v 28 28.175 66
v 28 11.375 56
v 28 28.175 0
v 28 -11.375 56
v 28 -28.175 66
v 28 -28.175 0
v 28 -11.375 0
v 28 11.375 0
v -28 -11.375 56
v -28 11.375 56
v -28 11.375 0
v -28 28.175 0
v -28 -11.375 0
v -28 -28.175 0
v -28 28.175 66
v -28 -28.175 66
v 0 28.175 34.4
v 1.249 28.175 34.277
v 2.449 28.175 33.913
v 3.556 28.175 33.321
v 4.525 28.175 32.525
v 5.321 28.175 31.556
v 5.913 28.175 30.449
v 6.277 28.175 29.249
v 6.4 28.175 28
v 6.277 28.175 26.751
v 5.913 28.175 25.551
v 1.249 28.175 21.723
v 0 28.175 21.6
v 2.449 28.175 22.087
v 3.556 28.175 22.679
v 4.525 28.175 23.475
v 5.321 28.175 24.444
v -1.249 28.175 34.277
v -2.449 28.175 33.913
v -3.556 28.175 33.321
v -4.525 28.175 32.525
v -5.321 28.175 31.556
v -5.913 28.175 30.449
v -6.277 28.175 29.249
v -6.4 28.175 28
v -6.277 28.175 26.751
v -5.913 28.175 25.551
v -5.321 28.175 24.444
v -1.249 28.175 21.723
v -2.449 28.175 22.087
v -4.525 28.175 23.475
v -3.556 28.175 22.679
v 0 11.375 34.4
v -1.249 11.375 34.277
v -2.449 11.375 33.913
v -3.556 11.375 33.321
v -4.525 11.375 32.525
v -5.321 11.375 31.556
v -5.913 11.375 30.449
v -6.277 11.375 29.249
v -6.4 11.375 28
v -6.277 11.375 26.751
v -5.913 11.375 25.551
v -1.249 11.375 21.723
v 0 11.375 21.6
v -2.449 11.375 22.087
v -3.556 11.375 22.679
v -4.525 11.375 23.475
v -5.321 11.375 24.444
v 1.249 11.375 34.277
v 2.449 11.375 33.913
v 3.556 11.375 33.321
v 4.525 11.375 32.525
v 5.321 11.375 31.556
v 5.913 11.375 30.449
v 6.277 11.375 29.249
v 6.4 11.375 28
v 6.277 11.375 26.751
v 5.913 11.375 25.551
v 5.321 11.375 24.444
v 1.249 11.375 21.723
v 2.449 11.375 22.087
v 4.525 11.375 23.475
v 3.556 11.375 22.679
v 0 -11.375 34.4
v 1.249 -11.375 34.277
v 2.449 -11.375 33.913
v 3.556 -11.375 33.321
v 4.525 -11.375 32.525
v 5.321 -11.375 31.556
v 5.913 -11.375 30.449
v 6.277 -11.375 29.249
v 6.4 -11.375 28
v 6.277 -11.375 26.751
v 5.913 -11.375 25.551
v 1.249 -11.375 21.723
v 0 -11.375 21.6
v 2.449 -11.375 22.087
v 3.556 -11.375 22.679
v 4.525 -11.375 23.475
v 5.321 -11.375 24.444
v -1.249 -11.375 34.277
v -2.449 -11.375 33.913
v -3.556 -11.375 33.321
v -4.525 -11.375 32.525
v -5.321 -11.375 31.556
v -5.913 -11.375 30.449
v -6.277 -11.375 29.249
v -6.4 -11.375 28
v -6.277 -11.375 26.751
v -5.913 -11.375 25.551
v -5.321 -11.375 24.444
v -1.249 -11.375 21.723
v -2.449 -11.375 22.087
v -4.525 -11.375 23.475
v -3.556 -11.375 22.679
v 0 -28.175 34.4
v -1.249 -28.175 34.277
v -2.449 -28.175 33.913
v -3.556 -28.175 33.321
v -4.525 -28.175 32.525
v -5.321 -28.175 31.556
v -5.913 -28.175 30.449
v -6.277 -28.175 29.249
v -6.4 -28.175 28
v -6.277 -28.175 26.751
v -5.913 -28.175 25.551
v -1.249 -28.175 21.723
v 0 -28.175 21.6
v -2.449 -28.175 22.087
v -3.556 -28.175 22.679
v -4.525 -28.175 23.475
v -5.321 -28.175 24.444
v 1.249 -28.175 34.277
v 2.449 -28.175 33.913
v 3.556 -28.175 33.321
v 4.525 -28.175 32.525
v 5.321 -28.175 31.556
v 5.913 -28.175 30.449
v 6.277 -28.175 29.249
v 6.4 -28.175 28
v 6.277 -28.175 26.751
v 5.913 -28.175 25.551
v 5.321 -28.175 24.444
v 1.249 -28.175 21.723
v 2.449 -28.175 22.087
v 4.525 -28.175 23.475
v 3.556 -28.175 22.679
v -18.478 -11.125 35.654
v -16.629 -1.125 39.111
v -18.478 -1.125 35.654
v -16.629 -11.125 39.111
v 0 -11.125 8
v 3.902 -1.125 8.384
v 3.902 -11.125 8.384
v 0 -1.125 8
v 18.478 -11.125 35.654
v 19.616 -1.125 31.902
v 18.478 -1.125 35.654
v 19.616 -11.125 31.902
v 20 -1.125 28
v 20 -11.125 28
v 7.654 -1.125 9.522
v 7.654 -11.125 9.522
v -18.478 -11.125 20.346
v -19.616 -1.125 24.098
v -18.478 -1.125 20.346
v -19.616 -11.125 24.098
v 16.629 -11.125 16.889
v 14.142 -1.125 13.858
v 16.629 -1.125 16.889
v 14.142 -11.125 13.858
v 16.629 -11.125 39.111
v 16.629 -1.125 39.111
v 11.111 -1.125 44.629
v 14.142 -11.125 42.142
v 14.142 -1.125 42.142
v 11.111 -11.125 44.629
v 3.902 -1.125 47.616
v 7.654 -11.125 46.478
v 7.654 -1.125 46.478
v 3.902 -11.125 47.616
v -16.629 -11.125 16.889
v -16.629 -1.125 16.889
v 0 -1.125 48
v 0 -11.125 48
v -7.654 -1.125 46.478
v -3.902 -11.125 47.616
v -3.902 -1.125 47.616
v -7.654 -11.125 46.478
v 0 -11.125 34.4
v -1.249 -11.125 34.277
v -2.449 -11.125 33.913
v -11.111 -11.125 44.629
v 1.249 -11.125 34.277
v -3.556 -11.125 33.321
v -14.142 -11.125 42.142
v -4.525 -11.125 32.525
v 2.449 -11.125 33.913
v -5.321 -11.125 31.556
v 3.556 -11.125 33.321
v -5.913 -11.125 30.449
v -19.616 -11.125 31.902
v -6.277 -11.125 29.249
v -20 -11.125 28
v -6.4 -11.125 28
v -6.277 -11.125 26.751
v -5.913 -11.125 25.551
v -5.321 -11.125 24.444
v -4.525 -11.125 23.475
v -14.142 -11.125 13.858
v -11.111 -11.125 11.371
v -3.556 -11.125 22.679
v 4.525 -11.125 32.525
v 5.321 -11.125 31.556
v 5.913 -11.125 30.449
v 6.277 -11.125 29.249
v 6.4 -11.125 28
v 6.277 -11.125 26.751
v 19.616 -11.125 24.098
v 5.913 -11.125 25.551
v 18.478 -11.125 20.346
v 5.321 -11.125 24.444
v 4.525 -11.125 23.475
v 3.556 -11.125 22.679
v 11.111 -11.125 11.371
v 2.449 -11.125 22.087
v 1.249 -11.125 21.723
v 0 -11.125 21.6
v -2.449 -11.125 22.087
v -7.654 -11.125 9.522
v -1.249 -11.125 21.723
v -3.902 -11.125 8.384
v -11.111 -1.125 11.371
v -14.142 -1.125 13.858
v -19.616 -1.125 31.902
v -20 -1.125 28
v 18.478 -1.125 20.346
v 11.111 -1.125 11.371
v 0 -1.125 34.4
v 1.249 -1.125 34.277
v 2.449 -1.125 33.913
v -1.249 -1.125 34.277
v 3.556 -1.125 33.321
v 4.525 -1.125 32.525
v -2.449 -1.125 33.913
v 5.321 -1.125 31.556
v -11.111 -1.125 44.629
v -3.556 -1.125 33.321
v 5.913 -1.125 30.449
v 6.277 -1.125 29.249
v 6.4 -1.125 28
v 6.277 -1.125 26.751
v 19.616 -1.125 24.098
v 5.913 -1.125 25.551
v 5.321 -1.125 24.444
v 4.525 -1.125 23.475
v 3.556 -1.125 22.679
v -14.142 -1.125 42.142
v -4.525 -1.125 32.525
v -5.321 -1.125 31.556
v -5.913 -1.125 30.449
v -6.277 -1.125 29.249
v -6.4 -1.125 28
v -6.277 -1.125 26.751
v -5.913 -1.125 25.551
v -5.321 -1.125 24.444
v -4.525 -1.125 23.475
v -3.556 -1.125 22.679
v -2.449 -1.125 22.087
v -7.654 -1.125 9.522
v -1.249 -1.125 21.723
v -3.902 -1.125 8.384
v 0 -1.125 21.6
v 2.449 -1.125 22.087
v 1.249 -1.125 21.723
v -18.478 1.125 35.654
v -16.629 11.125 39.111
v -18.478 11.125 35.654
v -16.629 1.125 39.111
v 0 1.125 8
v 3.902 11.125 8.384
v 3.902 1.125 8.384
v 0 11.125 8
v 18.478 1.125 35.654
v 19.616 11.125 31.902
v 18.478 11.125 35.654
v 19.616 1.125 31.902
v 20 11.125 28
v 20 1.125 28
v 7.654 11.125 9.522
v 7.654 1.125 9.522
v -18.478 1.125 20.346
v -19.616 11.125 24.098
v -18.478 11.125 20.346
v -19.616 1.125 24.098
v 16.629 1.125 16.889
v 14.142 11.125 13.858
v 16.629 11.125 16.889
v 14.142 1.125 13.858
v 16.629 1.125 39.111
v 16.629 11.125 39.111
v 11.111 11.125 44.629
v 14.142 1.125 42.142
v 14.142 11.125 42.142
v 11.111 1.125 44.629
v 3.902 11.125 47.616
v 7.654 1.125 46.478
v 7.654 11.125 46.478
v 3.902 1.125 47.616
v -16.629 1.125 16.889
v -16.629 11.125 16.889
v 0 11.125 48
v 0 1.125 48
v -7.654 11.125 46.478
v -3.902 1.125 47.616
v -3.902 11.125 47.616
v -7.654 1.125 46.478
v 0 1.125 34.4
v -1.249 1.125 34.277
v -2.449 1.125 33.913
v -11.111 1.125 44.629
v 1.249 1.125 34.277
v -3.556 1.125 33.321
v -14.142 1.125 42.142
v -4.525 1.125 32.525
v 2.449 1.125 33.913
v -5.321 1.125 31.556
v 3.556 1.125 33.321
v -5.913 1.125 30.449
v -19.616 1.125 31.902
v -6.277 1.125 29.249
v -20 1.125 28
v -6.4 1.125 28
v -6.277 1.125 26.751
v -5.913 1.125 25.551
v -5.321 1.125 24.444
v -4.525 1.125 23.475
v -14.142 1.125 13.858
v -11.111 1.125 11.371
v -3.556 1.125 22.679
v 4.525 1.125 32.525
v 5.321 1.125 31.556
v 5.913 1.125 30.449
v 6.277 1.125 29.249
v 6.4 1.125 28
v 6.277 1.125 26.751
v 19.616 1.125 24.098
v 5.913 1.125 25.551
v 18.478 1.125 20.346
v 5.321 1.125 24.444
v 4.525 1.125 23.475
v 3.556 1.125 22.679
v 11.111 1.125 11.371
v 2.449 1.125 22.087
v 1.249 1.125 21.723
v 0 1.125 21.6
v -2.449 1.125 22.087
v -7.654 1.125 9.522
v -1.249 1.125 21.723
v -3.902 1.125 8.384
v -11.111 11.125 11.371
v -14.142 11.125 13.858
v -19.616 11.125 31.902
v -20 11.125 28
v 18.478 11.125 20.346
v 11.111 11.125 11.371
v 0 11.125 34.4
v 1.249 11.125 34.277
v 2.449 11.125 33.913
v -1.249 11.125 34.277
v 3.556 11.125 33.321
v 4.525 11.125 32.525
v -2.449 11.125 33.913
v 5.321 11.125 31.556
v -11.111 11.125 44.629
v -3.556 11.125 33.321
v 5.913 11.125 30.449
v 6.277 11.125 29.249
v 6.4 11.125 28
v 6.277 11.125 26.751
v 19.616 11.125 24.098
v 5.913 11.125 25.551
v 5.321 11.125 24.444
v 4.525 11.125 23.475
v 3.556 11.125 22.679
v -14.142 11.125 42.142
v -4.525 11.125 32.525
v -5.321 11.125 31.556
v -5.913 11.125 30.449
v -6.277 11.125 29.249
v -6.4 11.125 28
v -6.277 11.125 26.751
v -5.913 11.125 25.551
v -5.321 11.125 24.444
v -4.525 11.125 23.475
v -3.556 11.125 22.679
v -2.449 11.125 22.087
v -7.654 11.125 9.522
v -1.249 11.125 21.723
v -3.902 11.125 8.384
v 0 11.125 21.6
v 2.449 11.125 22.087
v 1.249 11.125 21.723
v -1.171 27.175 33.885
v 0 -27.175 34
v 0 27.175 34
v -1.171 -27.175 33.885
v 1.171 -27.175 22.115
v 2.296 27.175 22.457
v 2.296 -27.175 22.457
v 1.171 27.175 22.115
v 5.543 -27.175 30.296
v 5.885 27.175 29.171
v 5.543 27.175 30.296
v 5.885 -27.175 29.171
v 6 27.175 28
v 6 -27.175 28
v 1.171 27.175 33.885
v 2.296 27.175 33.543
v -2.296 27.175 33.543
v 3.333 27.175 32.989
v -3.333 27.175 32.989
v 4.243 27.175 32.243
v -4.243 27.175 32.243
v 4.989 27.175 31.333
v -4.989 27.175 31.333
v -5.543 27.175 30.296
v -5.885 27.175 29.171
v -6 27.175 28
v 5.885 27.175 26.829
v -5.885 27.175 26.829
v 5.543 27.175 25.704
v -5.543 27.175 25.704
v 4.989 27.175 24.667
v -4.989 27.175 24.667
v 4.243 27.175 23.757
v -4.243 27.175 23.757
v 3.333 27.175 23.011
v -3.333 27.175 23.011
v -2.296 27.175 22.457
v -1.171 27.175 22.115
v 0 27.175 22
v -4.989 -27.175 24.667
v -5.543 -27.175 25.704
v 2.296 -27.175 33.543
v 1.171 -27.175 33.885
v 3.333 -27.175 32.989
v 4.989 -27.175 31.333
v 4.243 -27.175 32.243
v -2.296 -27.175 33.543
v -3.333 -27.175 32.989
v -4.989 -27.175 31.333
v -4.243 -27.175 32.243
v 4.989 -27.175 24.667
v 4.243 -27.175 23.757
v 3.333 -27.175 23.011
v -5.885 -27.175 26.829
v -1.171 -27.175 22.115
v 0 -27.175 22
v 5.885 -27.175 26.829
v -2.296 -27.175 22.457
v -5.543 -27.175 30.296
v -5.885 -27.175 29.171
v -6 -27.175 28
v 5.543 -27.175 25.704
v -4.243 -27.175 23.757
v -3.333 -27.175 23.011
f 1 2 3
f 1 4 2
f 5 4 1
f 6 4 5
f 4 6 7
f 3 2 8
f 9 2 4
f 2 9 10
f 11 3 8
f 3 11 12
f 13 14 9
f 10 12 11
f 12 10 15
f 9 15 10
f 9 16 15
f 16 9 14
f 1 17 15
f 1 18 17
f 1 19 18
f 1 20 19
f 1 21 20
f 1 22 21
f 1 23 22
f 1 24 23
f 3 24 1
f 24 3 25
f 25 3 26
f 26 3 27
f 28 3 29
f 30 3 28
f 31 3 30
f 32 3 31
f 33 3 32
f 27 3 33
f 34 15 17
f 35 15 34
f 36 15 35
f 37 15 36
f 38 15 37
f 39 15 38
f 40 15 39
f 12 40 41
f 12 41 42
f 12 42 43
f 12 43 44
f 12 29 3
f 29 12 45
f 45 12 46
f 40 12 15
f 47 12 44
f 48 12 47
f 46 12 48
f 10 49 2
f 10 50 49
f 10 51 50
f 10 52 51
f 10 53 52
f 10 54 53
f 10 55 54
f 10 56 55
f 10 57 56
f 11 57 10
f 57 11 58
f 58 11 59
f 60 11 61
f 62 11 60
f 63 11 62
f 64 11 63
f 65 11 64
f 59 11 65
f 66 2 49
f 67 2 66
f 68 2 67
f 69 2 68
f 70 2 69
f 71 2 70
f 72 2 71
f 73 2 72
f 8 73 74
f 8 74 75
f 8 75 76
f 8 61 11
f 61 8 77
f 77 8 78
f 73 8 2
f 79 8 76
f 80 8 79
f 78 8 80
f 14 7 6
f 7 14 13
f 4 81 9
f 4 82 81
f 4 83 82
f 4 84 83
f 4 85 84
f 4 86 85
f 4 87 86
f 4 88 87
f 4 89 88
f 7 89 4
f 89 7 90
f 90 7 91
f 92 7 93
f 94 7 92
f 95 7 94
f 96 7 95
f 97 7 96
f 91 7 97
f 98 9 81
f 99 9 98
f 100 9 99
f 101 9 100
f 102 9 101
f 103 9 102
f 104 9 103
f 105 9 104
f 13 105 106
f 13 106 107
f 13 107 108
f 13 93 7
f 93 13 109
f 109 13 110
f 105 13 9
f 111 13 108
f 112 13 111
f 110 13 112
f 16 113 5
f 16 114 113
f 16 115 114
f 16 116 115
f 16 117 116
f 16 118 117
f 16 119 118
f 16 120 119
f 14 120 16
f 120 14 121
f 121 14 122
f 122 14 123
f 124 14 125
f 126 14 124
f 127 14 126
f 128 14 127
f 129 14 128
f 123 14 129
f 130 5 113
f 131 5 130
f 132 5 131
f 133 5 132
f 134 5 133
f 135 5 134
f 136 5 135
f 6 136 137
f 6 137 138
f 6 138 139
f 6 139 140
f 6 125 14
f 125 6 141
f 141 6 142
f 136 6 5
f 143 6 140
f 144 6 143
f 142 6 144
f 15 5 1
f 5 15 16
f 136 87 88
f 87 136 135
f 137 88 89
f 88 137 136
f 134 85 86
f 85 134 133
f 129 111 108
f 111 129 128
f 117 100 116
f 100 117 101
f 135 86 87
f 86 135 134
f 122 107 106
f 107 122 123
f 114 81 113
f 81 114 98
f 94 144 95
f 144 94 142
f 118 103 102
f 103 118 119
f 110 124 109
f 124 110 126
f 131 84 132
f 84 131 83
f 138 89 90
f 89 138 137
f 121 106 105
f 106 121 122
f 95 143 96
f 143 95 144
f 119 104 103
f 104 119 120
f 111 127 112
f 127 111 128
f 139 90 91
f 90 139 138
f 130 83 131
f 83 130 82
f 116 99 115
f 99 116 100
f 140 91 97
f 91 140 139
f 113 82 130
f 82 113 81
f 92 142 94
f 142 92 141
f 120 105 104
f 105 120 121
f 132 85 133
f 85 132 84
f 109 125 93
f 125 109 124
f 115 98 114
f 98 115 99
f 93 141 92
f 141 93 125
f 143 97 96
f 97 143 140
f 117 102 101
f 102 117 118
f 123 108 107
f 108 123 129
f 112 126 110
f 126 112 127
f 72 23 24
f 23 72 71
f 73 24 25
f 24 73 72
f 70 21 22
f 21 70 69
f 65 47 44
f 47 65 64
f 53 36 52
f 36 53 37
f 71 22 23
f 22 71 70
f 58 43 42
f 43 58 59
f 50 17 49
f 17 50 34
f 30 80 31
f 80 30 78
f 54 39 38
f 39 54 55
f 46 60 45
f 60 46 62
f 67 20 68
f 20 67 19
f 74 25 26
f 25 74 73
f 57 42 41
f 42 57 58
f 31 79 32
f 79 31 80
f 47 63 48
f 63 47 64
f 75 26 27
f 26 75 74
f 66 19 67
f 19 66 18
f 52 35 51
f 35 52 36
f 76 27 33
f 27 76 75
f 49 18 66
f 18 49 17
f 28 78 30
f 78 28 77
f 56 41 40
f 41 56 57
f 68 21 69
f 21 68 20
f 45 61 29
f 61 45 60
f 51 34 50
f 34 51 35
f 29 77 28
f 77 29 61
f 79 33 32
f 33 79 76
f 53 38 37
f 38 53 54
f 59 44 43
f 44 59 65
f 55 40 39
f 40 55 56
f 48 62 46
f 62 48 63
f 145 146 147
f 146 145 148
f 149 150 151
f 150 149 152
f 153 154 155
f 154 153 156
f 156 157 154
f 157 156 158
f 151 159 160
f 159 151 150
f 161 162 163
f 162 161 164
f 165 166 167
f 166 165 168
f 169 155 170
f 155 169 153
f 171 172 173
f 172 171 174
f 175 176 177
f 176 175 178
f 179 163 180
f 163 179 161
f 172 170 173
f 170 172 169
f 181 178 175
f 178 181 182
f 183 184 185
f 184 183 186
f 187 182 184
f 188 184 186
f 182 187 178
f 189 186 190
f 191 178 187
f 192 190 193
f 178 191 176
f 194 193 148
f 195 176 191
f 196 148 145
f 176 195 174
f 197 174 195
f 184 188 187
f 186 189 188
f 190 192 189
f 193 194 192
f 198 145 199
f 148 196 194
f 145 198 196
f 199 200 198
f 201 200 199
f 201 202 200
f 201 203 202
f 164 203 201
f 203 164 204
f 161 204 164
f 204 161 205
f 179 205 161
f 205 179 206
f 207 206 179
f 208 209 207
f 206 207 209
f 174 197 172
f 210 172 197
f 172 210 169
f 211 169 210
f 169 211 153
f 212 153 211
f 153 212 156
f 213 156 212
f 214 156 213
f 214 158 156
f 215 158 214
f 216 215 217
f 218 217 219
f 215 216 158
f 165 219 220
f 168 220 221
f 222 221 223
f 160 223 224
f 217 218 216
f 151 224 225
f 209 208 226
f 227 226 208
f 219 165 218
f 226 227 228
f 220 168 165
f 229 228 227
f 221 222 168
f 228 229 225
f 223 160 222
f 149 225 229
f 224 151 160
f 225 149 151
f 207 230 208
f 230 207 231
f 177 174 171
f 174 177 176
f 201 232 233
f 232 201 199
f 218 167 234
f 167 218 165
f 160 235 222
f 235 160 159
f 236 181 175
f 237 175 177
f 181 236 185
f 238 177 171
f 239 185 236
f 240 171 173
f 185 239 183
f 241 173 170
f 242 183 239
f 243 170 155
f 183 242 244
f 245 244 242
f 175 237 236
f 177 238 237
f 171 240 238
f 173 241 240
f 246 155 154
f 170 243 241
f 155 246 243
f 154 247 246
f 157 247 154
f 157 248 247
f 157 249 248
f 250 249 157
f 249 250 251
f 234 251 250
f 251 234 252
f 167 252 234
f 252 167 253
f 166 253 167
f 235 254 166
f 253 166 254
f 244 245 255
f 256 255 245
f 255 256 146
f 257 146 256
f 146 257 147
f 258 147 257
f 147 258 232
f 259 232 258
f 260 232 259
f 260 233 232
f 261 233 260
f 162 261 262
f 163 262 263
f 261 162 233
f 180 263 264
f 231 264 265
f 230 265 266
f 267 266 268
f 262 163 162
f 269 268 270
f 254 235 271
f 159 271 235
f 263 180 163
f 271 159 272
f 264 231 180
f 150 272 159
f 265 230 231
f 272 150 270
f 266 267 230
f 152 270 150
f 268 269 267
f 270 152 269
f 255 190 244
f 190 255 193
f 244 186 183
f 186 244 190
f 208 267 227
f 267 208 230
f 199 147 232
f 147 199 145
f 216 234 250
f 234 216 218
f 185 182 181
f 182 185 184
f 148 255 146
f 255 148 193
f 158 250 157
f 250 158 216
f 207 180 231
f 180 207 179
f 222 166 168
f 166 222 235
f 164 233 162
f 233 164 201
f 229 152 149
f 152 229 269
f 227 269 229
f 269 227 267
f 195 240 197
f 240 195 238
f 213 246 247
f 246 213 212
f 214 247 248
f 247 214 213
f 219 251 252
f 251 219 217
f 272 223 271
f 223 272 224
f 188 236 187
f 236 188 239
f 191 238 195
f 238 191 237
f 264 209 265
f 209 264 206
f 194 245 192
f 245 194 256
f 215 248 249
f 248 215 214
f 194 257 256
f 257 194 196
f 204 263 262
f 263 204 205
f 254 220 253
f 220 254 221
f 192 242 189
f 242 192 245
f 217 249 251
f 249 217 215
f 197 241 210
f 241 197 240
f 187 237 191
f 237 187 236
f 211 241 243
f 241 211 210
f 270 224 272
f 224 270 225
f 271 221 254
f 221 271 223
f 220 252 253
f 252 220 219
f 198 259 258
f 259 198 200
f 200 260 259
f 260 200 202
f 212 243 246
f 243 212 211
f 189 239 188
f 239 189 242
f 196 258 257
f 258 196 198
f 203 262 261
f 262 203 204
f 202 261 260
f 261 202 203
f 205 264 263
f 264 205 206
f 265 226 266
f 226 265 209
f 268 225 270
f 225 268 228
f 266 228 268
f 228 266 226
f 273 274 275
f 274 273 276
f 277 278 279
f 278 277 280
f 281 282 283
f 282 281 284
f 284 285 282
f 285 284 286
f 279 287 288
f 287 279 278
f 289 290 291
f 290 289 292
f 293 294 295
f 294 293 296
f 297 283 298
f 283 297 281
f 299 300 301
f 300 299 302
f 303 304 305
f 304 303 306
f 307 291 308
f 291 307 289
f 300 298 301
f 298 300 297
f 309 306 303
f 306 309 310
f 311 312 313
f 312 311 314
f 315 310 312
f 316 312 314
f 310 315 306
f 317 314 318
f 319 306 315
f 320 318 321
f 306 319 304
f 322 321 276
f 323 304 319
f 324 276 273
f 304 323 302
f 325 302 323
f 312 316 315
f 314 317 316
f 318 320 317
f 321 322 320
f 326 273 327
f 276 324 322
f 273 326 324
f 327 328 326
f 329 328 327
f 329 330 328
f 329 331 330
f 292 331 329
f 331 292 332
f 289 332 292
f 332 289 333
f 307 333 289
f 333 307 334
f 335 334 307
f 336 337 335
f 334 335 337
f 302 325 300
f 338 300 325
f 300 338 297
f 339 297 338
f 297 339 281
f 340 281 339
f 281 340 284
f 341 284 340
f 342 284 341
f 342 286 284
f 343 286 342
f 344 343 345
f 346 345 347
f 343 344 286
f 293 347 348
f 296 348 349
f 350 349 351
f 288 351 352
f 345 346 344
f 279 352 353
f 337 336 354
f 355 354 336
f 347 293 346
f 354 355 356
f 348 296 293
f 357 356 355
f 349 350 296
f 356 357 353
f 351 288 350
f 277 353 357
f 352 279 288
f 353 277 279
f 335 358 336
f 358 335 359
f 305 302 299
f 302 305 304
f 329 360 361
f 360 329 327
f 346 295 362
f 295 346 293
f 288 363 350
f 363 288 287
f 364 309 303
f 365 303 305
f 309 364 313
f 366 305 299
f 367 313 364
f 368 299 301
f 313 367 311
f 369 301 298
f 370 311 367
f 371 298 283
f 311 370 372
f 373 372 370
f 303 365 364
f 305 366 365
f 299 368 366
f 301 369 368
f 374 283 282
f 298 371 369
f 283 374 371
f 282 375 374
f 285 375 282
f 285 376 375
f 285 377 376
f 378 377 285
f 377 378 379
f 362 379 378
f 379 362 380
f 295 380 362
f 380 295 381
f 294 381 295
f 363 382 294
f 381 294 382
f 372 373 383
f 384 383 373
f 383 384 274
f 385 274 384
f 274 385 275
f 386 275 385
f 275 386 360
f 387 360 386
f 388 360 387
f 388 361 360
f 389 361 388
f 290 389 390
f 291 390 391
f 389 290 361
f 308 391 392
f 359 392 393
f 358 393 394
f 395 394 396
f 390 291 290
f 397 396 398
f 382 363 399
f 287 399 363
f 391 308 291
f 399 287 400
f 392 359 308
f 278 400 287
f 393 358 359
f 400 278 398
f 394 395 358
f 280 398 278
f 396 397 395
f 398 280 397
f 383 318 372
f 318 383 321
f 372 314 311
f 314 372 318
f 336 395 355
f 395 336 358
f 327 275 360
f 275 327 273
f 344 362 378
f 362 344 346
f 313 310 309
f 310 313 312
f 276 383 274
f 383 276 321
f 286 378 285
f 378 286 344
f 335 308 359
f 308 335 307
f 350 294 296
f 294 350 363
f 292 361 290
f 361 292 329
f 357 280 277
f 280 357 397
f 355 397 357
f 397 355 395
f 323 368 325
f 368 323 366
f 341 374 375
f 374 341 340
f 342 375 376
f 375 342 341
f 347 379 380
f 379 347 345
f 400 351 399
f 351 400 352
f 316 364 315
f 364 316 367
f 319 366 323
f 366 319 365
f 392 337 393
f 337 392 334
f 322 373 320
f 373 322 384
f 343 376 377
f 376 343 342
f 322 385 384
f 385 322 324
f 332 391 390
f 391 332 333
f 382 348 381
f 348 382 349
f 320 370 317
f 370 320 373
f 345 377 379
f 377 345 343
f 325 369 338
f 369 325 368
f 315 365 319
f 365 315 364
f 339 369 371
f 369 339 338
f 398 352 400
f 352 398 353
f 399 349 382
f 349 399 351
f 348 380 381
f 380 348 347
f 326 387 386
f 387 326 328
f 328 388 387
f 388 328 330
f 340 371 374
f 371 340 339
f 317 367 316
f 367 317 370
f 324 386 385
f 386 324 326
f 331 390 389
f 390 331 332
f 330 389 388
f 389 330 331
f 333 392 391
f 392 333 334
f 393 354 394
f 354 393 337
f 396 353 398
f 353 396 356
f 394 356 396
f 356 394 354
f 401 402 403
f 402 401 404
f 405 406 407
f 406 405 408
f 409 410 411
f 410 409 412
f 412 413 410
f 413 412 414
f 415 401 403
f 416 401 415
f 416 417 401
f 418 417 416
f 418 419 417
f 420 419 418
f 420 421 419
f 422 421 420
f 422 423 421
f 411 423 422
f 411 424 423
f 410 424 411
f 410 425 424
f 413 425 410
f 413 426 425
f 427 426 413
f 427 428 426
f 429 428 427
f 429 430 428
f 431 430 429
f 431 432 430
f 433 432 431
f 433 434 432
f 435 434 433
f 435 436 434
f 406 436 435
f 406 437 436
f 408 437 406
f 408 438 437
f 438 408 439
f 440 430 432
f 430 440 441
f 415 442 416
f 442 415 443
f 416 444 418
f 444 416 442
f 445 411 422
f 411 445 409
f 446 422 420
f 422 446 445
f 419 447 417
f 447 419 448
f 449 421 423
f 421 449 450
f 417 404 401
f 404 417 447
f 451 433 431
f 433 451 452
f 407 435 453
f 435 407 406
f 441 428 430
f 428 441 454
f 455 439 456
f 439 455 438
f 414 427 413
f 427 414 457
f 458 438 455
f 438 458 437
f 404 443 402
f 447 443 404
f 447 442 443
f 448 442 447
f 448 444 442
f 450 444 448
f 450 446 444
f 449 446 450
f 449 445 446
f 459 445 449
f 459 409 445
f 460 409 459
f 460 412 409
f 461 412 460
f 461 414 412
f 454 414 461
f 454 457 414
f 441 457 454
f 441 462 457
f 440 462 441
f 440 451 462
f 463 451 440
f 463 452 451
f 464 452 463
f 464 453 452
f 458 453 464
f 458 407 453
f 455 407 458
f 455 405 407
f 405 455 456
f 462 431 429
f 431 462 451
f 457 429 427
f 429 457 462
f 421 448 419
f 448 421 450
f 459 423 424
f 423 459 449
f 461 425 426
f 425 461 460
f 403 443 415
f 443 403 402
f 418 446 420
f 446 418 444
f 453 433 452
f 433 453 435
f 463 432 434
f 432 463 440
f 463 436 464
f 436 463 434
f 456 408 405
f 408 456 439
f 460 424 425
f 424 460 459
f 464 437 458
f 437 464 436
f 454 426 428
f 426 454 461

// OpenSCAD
$fn = 32;

// ------------------------------------------------------------------------
// Trolley wheel set: wheels d40, fork 56 mm tall
// Every part is its own module, assembly() places every instance.
// ------------------------------------------------------------------------

// --- part 1 ---
module trolley_fork() {
  difference() {
    union() {
      translate([-28, 11.375, 0]) cube([56, 16.8, 56]);
      translate([-28, -28.175, 0]) cube([56, 16.8, 56]);
      translate([-28, -28.175, 56]) cube([56, 56.35, 10]);
    }
    translate([0, -19.775, 28]) rotate([90, 0, 0]) cylinder(h = 18.8, d = 12.8, center = true);
    translate([0, 19.775, 28]) rotate([90, 0, 0]) cylinder(h = 18.8, d = 12.8, center = true);
  }
}

// --- part 2 ---
module trolley_wheel() {
  difference() {
      translate([0, 0, 0]) cylinder(h = 10, d = 40);
      translate([0, 0, -1]) cylinder(h = 12, d = 12.8);
    }
}

// --- part 3 ---
module trolley_axle() {
  translate([0, 0, -27.175]) cylinder(h = 54.35, d = 12);
}

// --- assembly ---
module assembly() {
  color([0.80, 0.24, 0.20]) translate([0, 0, 0]) rotate([0, 0, 0]) trolley_fork();
  color([0.20, 0.45, 0.75]) translate([0, -1.125, 28]) rotate([90, 0, 0]) trolley_wheel();
  color([0.25, 0.62, 0.32]) translate([0, 11.125, 28]) rotate([90, 0, 0]) trolley_wheel();
  color([0.92, 0.70, 0.18]) translate([0, 0, 28]) rotate([90, 0, 0]) trolley_axle();
}

assembly();
